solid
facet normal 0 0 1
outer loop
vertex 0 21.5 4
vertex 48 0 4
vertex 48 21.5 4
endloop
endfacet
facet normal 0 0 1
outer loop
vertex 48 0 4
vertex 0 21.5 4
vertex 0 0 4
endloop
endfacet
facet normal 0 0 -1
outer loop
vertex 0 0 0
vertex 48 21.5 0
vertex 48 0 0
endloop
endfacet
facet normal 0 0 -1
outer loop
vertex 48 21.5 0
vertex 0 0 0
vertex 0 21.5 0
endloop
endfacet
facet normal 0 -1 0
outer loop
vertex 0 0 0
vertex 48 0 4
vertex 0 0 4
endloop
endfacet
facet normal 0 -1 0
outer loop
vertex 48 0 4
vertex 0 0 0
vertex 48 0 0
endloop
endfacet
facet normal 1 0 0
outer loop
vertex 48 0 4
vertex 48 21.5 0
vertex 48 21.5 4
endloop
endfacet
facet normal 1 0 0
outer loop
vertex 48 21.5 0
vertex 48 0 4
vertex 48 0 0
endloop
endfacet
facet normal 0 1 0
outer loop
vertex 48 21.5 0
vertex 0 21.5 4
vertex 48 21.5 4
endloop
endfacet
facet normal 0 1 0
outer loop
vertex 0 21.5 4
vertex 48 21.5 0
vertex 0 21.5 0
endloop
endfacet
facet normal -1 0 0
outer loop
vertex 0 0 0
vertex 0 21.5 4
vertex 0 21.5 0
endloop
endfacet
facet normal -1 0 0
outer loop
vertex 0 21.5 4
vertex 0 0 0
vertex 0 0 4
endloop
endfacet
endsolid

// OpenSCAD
// file: defs.scad
/* Enclosure for servo actuating up/down shutter switch
 */

CHAMFER   = 3.5;
ATOM      = 0.01;
TOLERANCE = .5;

SWITCHBOX_SIDE_BACK                    = 73;
SWITCHBOX_SIDE_FRONT                   = 70;
SWITCHBOX_DEPTH                        = 52;
SWITCHBOX_BUTTONS_TRAVEL               =  8;

CABLE_CANAL_WIDTH                      = 35;
CABLE_CANAL_THICKNESS                  = 22;

SERVO_BODY_WIDTH                       = 19.6 + TOLERANCE;
SERVO_BODY_LENGTH                      = 40.4 + TOLERANCE;
SERVO_BODY_HEIGHT                      = 37 + TOLERANCE;
SERVO_AXIS_FROM_EDGE                   = 10.5;
SERVO_TABS_THICKNESS                   =  2.4;
SERVO_TABS_LENGTH                      =  7.6 + TOLERANCE;
SERVO_TABS_ELEVATION                   = 26;
SERVO_SCREWS_XDIST                     = 10;
SERVO_SCREWS_YDIST                     = 48.5;
SERVO_SCREW_DIAMETER                   =  1.8;

SERVO_AXIS_DIAMETER                    =  9;
SERVO_ARM_SPAN                         = 43;
SERVO_ARM_WIDTH                        = 10;
SERVO_ARM_THICKNESS                    =  3;
SERVO_ARM_ELEVATION                    = 42.7;
SERVO_ARM_ROTATION                     = 90;

SERVO_CABLE_CLEARANCE_WIDTH            =  5;

SERVO_POS_SINK                         = 24-ATOM +2;
MARGIN                                 =  5;

SERVO_HEIGHT                           = SERVO_ARM_ELEVATION + SERVO_ARM_THICKNESS;
SERVO_LENGTH                           = SERVO_BODY_LENGTH + 2*SERVO_TABS_LENGTH;

THICKNESS = 15;

ENCLOSURE_EXTRA                        = SERVO_HEIGHT;
ENCLOSURE_WIDTH                        = SWITCHBOX_SIDE_BACK + THICKNESS*2;
ENCLOSURE_LENGTH                       = ENCLOSURE_WIDTH + ENCLOSURE_EXTRA;
ENCLOSURE_HEIGHT                       = SWITCHBOX_DEPTH;

BINDING_DIAMETER                       = 20;
BINDING_HEIGHT                         = 15;
BINDING_SCREW_DIAMETER                 = 5;
BINDING_SCREW_HEAD_DIAMETER            = 9;

BOARD_LENGTH                           = 54;
BOARD_WIDTH                            = 21 +1;
BOARD_THICKNESS                        =  4 + 5;
BOARD_SCREW_FROM_EDGE                  =  2.5 + 1.2;
BOARD_SCREW_DIAMETER                   =  1.5;
BOARD_SCREW_SPACING                    = 12;
BOARD_SCREW_DEPTH                      =  5;

BUTTON_CASE_SIDE                       = 12;
BUTTON_CASE_HEIGHT                     =  4-1;
BUTTON_KNOB_THICKNESS                  =  0.5;
BUTTON_KNOB_DIAMETER                   =  6.5;
BUTTON_CONTACT_EXCESS                  =  1;

BUTTONS_SPACING                        = 3;
BUTTONS_NB                             = 3;

BUTTONS_PROTOBOARD_THICKNESS           = 4;
BUTTONS_PROTOBOARD_THICKNESS_CLEARANCE = 12;
BUTTONS_PROTOBOARD_MARGIN_L            = 5;
BUTTONS_PROTOBOARD_MARGIN_W            = 15;
BUTTONS_PROTOBOARD_LENGTH              = BUTTON_CASE_SIDE*BUTTONS_NB 
                                         + BUTTONS_SPACING*(BUTTONS_NB-1)
                                         + BUTTONS_PROTOBOARD_MARGIN_L*2;
BUTTONS_PROTOBOARD_WIDTH               = BUTTON_CASE_SIDE + BUTTONS_PROTOBOARD_MARGIN_W*2;

PROTOBOARD_BLOCKER_THICKNESS           = 3;
PROTOBOARD_BLOCKER_MARGIN              = 12;
// main file
include <defs.scad>

/*
19
27
35
*/

module plate() {
    cube([48, BOARD_WIDTH - TOLERANCE, 4]);
}


plate();
